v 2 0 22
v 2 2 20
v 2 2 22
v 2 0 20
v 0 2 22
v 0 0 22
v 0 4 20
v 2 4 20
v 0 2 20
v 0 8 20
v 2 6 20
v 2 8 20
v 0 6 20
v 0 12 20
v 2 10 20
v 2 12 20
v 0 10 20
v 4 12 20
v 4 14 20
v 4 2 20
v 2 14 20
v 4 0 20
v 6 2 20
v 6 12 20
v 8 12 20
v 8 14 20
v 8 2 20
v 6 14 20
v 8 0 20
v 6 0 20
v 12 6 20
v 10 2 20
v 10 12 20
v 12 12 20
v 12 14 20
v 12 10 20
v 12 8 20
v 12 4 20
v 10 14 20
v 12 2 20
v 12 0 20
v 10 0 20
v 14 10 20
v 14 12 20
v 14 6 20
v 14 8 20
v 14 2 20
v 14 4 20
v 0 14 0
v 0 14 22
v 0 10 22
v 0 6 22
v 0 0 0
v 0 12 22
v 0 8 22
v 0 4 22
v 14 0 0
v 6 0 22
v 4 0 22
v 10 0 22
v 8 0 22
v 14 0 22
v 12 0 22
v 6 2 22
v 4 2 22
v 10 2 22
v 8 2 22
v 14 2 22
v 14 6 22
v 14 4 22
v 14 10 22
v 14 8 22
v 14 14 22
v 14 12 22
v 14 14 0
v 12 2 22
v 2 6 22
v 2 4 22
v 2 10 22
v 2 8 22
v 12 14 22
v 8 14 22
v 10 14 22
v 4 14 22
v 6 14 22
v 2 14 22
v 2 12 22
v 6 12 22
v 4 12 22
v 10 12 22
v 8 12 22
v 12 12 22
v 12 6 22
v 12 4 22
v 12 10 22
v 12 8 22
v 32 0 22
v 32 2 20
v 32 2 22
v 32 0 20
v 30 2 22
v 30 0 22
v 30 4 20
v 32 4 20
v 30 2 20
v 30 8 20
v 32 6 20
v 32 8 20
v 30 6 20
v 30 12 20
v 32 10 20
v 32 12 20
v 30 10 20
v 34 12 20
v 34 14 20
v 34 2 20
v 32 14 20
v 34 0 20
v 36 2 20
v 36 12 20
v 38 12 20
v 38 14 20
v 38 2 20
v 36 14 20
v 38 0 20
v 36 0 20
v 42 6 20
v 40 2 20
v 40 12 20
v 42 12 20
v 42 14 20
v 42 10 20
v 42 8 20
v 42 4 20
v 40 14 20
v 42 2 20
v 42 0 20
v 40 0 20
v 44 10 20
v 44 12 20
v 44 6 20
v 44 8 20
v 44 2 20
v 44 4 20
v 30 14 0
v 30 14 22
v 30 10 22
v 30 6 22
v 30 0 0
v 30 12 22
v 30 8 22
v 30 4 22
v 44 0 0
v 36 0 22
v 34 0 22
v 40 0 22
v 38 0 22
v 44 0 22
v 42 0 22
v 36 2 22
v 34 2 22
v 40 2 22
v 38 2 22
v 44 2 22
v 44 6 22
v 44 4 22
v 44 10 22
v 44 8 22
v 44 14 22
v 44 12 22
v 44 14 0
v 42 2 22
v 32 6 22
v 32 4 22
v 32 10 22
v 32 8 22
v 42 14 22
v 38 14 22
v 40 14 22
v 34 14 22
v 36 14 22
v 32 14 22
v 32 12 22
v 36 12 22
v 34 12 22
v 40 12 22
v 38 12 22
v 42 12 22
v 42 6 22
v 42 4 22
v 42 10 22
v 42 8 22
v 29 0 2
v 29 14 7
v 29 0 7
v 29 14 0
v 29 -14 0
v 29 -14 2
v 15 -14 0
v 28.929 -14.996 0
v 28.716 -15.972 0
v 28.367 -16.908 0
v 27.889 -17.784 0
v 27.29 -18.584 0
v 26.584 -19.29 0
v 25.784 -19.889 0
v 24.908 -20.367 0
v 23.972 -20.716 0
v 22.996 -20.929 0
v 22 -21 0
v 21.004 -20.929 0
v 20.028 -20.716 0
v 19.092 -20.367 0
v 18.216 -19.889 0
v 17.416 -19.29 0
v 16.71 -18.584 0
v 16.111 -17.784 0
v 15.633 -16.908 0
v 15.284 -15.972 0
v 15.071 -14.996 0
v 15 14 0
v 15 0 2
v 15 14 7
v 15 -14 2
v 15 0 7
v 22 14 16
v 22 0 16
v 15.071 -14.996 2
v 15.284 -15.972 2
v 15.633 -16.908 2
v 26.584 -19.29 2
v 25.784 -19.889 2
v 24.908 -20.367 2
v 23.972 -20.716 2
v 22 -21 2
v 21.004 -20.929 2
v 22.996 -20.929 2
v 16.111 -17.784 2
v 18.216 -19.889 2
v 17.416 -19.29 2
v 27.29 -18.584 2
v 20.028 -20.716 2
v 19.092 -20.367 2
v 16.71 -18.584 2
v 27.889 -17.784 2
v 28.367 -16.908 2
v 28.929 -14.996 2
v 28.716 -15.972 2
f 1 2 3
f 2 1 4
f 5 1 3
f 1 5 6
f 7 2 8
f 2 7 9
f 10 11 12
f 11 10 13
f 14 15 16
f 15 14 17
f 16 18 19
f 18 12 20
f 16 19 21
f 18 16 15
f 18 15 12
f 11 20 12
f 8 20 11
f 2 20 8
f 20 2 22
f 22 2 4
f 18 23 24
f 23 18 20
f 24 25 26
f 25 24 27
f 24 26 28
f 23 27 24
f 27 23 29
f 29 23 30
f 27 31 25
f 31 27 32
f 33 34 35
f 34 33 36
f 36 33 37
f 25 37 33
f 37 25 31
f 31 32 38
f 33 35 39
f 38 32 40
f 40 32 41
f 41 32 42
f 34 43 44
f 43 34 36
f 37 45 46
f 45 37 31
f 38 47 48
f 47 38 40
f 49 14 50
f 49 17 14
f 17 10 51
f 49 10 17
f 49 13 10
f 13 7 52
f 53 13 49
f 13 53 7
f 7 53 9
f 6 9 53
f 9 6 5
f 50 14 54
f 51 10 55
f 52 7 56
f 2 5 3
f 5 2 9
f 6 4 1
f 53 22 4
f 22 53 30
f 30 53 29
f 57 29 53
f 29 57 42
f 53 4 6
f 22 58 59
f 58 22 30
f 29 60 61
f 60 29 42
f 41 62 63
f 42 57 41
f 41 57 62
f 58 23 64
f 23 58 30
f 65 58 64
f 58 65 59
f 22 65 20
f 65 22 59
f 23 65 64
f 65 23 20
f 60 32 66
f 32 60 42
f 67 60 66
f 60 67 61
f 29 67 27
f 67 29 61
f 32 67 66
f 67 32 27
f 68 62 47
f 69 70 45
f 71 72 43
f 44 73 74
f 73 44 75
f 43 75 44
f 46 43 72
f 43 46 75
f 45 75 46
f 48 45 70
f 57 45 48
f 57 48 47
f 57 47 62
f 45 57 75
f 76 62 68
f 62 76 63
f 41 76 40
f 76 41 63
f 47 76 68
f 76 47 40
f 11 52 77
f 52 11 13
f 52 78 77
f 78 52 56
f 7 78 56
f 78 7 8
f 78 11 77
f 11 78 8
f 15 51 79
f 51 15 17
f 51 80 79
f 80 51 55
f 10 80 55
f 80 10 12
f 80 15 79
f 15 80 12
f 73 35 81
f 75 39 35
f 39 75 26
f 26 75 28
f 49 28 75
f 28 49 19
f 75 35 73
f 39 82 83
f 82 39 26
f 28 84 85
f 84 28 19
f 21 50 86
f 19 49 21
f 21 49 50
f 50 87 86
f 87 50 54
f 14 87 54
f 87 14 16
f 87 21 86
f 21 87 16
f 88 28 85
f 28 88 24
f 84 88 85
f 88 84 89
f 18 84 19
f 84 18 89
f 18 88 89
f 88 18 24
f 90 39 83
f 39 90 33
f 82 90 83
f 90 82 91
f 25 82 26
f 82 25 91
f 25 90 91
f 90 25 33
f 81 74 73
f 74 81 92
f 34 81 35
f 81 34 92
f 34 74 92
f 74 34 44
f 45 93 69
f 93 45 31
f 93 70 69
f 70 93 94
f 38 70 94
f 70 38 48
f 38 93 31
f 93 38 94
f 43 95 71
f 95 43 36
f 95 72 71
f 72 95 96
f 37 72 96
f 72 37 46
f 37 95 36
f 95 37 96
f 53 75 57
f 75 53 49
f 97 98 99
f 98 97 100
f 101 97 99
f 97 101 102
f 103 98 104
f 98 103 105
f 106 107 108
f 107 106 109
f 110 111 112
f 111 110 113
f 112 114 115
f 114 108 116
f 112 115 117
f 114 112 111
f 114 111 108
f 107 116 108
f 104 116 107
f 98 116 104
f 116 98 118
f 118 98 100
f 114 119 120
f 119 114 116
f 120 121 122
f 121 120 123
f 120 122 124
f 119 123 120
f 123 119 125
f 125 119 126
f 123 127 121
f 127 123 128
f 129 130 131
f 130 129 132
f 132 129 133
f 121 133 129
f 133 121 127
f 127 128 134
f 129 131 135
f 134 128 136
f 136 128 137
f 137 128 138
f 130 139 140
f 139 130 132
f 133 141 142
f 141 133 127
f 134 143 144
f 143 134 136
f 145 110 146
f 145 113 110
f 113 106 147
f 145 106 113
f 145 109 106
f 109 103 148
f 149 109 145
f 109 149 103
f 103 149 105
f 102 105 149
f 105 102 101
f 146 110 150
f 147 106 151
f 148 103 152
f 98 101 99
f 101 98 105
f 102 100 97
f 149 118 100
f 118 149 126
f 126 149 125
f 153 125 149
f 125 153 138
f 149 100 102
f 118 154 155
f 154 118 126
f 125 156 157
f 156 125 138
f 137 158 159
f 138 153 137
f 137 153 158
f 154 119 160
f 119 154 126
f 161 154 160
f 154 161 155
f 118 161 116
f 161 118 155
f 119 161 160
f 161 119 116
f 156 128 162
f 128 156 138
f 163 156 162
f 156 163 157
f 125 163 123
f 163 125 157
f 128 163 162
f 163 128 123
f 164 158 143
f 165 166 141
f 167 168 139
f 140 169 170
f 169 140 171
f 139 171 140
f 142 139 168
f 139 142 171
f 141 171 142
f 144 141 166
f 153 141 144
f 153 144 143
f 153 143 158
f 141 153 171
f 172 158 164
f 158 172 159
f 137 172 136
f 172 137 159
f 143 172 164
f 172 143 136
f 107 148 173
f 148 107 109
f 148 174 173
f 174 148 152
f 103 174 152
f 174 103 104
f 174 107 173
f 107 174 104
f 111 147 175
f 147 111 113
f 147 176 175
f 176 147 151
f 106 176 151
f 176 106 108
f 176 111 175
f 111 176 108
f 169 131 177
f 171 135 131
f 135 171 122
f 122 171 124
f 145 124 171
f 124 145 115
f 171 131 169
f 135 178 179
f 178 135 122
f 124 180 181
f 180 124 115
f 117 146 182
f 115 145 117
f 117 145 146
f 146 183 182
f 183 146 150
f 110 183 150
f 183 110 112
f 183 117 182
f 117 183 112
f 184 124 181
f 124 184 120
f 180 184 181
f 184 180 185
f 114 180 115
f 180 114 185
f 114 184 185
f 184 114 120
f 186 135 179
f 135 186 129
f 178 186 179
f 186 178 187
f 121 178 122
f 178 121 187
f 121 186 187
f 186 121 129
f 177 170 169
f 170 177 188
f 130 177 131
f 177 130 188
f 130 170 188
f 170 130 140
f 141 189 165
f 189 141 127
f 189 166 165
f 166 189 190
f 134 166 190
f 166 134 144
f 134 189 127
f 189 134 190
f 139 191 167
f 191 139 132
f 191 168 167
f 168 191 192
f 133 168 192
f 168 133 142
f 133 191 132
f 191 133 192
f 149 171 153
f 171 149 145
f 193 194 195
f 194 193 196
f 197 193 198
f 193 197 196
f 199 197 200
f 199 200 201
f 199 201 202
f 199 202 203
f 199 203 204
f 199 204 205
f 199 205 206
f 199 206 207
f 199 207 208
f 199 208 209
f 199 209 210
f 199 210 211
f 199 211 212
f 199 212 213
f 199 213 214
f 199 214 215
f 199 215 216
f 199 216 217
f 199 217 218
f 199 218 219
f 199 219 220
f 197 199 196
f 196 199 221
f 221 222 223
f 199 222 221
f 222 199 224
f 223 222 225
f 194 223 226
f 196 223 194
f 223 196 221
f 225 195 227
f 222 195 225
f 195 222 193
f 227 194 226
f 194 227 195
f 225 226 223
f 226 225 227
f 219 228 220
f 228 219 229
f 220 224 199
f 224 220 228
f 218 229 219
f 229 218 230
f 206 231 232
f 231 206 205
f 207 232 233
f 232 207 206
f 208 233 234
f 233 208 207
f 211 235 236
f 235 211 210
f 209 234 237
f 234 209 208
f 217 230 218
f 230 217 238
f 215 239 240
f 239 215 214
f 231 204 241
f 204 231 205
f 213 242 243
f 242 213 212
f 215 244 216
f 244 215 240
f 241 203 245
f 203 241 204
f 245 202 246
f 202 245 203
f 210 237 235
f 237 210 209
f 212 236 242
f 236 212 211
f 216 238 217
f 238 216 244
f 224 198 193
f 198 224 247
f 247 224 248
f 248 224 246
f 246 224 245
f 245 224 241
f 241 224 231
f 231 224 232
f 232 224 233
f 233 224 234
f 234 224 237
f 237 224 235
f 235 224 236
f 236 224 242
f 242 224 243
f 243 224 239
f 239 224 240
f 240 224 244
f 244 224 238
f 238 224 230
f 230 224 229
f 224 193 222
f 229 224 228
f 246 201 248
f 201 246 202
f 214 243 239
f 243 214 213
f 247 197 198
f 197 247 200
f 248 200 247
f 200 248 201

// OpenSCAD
/*
 * This work by John Strunk & Julia Strunk is licensed under the Creative Commons
 * Attribution-ShareAlike 4.0 International License. To view a copy of
 * this license, visit http://creativecommons.org/licenses/by-sa/4.0/
 * or send a letter to Creative Commons, 444 Castro Street, Suite 900,
 * Mountain View, California, 94041, USA.
 */

$fa = 1;
$fs = 1;

module house() {
    cube([14, 14, 7]);
    translate([0, 14, 7])
        rotate([90, 0, 0])
            linear_extrude(height=14)
                polygon(points=[[0, 0], [14, 0], [7, 9]], convexity=2);
}


module cRow() {
    for (i = [0: 3]) {
        translate([i*4, 0, 0]) cube([2, 2, 2]);
    }
}

module cFence() {
    cRow();
    translate([2, 0, 0]) rotate([0, 0, 90]) cRow();
    translate([0, 12, 0]) cRow();
    translate([14, 0, 0]) rotate([0, 0, 90]) cRow();
}

module tower() {
    cube([14, 14, 20]);
    translate([0, 0, 20]) cFence();
}

module castle() {
    tower();
    translate([30, 0, 0]) tower();
    translate([15, 0, 0]) house();
}


module bridge() {
    translate([7, 14, 0]) difference() {
        cylinder(r = 7, h = 2);
        translate([-10, -20, -5]) cube([20, 20, 20]);
    }
    cube([14, 14, 2]);
}

castle();
translate([29, 0, 0]) rotate([0, 0, 180]) bridge();
